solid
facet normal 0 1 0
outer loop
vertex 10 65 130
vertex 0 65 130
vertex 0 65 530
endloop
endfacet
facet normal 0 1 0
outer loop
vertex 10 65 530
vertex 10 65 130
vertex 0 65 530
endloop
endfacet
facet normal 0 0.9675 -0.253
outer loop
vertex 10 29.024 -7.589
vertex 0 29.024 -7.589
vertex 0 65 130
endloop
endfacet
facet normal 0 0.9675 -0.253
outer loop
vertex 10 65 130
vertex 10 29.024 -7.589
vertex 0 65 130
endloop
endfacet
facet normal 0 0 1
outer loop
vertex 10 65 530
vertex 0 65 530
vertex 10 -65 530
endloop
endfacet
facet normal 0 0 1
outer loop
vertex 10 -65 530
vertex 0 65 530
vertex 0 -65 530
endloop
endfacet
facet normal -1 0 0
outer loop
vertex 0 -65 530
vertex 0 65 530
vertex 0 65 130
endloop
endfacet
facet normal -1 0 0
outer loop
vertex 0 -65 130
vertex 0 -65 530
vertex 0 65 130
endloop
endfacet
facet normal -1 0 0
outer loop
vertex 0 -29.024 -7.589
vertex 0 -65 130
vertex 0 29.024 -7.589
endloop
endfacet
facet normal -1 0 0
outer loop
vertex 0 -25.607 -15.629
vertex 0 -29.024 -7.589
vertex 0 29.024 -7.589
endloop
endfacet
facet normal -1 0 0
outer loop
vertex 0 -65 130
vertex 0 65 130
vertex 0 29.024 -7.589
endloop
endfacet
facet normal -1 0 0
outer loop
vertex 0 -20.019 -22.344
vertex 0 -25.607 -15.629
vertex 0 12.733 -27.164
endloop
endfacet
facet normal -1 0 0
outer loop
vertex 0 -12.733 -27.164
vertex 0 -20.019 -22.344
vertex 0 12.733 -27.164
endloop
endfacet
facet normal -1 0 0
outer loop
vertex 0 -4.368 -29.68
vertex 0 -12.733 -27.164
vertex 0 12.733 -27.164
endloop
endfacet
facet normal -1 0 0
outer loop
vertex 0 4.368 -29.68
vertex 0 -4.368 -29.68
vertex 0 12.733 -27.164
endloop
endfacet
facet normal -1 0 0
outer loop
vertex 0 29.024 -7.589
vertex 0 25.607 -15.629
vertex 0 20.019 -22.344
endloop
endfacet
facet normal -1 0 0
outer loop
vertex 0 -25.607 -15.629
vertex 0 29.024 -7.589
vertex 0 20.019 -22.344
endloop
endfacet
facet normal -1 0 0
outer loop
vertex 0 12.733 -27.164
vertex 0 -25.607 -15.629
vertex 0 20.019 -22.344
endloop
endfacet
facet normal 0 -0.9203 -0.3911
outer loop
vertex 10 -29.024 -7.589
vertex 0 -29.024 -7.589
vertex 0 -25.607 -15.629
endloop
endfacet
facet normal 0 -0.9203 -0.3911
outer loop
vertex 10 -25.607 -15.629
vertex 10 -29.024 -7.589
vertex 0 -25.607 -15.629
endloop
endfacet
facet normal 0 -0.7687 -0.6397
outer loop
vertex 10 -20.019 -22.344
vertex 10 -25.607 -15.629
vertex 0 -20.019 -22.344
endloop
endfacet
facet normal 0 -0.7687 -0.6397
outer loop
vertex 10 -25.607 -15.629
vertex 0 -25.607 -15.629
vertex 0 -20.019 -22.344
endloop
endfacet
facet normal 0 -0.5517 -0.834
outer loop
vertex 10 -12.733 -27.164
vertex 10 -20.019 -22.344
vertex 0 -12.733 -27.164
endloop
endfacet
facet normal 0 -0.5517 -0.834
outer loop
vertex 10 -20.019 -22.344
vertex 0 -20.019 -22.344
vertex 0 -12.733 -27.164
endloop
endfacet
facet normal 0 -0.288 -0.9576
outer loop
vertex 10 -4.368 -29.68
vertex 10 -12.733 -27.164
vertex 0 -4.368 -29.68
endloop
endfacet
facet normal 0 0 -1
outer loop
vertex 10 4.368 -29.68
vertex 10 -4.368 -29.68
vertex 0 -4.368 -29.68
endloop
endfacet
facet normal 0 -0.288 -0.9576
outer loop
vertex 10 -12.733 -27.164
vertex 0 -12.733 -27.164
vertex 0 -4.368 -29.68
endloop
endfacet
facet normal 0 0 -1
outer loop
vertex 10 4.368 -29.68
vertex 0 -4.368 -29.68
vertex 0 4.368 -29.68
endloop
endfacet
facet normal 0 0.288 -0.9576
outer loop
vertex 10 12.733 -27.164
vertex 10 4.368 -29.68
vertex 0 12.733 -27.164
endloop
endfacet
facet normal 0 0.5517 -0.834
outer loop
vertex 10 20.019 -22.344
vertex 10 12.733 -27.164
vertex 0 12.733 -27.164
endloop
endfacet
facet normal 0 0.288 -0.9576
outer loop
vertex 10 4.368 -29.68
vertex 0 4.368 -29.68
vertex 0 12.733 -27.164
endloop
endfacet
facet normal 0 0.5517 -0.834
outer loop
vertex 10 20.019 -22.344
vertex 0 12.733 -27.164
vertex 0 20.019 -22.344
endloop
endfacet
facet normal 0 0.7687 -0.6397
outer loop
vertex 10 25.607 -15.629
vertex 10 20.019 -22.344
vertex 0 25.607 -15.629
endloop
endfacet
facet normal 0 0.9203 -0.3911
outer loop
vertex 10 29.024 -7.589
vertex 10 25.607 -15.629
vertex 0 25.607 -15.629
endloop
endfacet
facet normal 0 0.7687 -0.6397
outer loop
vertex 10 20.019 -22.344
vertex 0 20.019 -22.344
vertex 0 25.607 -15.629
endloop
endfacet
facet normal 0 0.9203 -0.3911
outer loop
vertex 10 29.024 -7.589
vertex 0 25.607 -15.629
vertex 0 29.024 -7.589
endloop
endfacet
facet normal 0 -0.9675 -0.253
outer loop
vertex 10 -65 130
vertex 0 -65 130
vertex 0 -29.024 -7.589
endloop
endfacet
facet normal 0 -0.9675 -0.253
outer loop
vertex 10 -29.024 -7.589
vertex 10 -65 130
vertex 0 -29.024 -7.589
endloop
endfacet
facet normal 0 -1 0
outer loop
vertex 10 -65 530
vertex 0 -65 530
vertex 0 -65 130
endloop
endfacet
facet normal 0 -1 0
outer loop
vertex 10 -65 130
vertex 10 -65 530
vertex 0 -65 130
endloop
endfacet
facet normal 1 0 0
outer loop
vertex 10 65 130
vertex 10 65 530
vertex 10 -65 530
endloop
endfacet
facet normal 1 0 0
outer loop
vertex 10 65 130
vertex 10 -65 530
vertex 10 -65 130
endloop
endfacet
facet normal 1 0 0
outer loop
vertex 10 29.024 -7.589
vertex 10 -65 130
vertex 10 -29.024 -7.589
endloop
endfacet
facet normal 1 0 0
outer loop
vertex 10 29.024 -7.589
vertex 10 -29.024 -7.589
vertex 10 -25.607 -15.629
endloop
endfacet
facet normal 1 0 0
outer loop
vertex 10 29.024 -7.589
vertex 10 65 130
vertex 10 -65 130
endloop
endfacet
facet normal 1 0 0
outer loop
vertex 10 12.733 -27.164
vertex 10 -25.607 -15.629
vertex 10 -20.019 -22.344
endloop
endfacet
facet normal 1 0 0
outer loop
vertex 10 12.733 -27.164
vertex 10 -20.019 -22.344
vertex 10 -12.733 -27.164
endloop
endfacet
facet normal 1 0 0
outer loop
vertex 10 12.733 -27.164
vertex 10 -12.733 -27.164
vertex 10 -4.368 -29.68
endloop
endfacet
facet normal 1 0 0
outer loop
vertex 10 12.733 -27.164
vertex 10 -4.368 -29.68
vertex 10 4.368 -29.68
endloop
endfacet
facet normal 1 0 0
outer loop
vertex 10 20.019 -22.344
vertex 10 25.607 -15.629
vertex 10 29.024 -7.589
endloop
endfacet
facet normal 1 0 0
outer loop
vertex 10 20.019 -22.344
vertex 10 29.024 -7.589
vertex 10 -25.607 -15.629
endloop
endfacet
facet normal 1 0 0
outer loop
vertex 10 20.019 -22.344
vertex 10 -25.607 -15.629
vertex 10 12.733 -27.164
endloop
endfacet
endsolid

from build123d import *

# Parameters (mm, degrees)
EXTRUDE_1_DEPTH = 10


with BuildPart() as part:
    # 草图1 → 凸台-拉伸1 (new body)
    with BuildSketch(Plane(origin=(0, 0, 0), x_dir=(0, 0, -1), z_dir=(1, 0, 0))):
        with BuildLine():
            Line((7.589042449, 29.024238745), (-130, 65))
            Line((-130, 65), (-530, 65))
            Line((-530, 65), (-530, -65))
            Line((-530, -65), (-130, -65))
            Line((-130, -65), (7.589042449, -29.024238745))
            ThreePointArc((7.589042449, -29.024238745), (30, 0), (7.589042449, 29.024238745))
        make_face()
    extrude(amount=EXTRUDE_1_DEPTH)


solid = part.part
